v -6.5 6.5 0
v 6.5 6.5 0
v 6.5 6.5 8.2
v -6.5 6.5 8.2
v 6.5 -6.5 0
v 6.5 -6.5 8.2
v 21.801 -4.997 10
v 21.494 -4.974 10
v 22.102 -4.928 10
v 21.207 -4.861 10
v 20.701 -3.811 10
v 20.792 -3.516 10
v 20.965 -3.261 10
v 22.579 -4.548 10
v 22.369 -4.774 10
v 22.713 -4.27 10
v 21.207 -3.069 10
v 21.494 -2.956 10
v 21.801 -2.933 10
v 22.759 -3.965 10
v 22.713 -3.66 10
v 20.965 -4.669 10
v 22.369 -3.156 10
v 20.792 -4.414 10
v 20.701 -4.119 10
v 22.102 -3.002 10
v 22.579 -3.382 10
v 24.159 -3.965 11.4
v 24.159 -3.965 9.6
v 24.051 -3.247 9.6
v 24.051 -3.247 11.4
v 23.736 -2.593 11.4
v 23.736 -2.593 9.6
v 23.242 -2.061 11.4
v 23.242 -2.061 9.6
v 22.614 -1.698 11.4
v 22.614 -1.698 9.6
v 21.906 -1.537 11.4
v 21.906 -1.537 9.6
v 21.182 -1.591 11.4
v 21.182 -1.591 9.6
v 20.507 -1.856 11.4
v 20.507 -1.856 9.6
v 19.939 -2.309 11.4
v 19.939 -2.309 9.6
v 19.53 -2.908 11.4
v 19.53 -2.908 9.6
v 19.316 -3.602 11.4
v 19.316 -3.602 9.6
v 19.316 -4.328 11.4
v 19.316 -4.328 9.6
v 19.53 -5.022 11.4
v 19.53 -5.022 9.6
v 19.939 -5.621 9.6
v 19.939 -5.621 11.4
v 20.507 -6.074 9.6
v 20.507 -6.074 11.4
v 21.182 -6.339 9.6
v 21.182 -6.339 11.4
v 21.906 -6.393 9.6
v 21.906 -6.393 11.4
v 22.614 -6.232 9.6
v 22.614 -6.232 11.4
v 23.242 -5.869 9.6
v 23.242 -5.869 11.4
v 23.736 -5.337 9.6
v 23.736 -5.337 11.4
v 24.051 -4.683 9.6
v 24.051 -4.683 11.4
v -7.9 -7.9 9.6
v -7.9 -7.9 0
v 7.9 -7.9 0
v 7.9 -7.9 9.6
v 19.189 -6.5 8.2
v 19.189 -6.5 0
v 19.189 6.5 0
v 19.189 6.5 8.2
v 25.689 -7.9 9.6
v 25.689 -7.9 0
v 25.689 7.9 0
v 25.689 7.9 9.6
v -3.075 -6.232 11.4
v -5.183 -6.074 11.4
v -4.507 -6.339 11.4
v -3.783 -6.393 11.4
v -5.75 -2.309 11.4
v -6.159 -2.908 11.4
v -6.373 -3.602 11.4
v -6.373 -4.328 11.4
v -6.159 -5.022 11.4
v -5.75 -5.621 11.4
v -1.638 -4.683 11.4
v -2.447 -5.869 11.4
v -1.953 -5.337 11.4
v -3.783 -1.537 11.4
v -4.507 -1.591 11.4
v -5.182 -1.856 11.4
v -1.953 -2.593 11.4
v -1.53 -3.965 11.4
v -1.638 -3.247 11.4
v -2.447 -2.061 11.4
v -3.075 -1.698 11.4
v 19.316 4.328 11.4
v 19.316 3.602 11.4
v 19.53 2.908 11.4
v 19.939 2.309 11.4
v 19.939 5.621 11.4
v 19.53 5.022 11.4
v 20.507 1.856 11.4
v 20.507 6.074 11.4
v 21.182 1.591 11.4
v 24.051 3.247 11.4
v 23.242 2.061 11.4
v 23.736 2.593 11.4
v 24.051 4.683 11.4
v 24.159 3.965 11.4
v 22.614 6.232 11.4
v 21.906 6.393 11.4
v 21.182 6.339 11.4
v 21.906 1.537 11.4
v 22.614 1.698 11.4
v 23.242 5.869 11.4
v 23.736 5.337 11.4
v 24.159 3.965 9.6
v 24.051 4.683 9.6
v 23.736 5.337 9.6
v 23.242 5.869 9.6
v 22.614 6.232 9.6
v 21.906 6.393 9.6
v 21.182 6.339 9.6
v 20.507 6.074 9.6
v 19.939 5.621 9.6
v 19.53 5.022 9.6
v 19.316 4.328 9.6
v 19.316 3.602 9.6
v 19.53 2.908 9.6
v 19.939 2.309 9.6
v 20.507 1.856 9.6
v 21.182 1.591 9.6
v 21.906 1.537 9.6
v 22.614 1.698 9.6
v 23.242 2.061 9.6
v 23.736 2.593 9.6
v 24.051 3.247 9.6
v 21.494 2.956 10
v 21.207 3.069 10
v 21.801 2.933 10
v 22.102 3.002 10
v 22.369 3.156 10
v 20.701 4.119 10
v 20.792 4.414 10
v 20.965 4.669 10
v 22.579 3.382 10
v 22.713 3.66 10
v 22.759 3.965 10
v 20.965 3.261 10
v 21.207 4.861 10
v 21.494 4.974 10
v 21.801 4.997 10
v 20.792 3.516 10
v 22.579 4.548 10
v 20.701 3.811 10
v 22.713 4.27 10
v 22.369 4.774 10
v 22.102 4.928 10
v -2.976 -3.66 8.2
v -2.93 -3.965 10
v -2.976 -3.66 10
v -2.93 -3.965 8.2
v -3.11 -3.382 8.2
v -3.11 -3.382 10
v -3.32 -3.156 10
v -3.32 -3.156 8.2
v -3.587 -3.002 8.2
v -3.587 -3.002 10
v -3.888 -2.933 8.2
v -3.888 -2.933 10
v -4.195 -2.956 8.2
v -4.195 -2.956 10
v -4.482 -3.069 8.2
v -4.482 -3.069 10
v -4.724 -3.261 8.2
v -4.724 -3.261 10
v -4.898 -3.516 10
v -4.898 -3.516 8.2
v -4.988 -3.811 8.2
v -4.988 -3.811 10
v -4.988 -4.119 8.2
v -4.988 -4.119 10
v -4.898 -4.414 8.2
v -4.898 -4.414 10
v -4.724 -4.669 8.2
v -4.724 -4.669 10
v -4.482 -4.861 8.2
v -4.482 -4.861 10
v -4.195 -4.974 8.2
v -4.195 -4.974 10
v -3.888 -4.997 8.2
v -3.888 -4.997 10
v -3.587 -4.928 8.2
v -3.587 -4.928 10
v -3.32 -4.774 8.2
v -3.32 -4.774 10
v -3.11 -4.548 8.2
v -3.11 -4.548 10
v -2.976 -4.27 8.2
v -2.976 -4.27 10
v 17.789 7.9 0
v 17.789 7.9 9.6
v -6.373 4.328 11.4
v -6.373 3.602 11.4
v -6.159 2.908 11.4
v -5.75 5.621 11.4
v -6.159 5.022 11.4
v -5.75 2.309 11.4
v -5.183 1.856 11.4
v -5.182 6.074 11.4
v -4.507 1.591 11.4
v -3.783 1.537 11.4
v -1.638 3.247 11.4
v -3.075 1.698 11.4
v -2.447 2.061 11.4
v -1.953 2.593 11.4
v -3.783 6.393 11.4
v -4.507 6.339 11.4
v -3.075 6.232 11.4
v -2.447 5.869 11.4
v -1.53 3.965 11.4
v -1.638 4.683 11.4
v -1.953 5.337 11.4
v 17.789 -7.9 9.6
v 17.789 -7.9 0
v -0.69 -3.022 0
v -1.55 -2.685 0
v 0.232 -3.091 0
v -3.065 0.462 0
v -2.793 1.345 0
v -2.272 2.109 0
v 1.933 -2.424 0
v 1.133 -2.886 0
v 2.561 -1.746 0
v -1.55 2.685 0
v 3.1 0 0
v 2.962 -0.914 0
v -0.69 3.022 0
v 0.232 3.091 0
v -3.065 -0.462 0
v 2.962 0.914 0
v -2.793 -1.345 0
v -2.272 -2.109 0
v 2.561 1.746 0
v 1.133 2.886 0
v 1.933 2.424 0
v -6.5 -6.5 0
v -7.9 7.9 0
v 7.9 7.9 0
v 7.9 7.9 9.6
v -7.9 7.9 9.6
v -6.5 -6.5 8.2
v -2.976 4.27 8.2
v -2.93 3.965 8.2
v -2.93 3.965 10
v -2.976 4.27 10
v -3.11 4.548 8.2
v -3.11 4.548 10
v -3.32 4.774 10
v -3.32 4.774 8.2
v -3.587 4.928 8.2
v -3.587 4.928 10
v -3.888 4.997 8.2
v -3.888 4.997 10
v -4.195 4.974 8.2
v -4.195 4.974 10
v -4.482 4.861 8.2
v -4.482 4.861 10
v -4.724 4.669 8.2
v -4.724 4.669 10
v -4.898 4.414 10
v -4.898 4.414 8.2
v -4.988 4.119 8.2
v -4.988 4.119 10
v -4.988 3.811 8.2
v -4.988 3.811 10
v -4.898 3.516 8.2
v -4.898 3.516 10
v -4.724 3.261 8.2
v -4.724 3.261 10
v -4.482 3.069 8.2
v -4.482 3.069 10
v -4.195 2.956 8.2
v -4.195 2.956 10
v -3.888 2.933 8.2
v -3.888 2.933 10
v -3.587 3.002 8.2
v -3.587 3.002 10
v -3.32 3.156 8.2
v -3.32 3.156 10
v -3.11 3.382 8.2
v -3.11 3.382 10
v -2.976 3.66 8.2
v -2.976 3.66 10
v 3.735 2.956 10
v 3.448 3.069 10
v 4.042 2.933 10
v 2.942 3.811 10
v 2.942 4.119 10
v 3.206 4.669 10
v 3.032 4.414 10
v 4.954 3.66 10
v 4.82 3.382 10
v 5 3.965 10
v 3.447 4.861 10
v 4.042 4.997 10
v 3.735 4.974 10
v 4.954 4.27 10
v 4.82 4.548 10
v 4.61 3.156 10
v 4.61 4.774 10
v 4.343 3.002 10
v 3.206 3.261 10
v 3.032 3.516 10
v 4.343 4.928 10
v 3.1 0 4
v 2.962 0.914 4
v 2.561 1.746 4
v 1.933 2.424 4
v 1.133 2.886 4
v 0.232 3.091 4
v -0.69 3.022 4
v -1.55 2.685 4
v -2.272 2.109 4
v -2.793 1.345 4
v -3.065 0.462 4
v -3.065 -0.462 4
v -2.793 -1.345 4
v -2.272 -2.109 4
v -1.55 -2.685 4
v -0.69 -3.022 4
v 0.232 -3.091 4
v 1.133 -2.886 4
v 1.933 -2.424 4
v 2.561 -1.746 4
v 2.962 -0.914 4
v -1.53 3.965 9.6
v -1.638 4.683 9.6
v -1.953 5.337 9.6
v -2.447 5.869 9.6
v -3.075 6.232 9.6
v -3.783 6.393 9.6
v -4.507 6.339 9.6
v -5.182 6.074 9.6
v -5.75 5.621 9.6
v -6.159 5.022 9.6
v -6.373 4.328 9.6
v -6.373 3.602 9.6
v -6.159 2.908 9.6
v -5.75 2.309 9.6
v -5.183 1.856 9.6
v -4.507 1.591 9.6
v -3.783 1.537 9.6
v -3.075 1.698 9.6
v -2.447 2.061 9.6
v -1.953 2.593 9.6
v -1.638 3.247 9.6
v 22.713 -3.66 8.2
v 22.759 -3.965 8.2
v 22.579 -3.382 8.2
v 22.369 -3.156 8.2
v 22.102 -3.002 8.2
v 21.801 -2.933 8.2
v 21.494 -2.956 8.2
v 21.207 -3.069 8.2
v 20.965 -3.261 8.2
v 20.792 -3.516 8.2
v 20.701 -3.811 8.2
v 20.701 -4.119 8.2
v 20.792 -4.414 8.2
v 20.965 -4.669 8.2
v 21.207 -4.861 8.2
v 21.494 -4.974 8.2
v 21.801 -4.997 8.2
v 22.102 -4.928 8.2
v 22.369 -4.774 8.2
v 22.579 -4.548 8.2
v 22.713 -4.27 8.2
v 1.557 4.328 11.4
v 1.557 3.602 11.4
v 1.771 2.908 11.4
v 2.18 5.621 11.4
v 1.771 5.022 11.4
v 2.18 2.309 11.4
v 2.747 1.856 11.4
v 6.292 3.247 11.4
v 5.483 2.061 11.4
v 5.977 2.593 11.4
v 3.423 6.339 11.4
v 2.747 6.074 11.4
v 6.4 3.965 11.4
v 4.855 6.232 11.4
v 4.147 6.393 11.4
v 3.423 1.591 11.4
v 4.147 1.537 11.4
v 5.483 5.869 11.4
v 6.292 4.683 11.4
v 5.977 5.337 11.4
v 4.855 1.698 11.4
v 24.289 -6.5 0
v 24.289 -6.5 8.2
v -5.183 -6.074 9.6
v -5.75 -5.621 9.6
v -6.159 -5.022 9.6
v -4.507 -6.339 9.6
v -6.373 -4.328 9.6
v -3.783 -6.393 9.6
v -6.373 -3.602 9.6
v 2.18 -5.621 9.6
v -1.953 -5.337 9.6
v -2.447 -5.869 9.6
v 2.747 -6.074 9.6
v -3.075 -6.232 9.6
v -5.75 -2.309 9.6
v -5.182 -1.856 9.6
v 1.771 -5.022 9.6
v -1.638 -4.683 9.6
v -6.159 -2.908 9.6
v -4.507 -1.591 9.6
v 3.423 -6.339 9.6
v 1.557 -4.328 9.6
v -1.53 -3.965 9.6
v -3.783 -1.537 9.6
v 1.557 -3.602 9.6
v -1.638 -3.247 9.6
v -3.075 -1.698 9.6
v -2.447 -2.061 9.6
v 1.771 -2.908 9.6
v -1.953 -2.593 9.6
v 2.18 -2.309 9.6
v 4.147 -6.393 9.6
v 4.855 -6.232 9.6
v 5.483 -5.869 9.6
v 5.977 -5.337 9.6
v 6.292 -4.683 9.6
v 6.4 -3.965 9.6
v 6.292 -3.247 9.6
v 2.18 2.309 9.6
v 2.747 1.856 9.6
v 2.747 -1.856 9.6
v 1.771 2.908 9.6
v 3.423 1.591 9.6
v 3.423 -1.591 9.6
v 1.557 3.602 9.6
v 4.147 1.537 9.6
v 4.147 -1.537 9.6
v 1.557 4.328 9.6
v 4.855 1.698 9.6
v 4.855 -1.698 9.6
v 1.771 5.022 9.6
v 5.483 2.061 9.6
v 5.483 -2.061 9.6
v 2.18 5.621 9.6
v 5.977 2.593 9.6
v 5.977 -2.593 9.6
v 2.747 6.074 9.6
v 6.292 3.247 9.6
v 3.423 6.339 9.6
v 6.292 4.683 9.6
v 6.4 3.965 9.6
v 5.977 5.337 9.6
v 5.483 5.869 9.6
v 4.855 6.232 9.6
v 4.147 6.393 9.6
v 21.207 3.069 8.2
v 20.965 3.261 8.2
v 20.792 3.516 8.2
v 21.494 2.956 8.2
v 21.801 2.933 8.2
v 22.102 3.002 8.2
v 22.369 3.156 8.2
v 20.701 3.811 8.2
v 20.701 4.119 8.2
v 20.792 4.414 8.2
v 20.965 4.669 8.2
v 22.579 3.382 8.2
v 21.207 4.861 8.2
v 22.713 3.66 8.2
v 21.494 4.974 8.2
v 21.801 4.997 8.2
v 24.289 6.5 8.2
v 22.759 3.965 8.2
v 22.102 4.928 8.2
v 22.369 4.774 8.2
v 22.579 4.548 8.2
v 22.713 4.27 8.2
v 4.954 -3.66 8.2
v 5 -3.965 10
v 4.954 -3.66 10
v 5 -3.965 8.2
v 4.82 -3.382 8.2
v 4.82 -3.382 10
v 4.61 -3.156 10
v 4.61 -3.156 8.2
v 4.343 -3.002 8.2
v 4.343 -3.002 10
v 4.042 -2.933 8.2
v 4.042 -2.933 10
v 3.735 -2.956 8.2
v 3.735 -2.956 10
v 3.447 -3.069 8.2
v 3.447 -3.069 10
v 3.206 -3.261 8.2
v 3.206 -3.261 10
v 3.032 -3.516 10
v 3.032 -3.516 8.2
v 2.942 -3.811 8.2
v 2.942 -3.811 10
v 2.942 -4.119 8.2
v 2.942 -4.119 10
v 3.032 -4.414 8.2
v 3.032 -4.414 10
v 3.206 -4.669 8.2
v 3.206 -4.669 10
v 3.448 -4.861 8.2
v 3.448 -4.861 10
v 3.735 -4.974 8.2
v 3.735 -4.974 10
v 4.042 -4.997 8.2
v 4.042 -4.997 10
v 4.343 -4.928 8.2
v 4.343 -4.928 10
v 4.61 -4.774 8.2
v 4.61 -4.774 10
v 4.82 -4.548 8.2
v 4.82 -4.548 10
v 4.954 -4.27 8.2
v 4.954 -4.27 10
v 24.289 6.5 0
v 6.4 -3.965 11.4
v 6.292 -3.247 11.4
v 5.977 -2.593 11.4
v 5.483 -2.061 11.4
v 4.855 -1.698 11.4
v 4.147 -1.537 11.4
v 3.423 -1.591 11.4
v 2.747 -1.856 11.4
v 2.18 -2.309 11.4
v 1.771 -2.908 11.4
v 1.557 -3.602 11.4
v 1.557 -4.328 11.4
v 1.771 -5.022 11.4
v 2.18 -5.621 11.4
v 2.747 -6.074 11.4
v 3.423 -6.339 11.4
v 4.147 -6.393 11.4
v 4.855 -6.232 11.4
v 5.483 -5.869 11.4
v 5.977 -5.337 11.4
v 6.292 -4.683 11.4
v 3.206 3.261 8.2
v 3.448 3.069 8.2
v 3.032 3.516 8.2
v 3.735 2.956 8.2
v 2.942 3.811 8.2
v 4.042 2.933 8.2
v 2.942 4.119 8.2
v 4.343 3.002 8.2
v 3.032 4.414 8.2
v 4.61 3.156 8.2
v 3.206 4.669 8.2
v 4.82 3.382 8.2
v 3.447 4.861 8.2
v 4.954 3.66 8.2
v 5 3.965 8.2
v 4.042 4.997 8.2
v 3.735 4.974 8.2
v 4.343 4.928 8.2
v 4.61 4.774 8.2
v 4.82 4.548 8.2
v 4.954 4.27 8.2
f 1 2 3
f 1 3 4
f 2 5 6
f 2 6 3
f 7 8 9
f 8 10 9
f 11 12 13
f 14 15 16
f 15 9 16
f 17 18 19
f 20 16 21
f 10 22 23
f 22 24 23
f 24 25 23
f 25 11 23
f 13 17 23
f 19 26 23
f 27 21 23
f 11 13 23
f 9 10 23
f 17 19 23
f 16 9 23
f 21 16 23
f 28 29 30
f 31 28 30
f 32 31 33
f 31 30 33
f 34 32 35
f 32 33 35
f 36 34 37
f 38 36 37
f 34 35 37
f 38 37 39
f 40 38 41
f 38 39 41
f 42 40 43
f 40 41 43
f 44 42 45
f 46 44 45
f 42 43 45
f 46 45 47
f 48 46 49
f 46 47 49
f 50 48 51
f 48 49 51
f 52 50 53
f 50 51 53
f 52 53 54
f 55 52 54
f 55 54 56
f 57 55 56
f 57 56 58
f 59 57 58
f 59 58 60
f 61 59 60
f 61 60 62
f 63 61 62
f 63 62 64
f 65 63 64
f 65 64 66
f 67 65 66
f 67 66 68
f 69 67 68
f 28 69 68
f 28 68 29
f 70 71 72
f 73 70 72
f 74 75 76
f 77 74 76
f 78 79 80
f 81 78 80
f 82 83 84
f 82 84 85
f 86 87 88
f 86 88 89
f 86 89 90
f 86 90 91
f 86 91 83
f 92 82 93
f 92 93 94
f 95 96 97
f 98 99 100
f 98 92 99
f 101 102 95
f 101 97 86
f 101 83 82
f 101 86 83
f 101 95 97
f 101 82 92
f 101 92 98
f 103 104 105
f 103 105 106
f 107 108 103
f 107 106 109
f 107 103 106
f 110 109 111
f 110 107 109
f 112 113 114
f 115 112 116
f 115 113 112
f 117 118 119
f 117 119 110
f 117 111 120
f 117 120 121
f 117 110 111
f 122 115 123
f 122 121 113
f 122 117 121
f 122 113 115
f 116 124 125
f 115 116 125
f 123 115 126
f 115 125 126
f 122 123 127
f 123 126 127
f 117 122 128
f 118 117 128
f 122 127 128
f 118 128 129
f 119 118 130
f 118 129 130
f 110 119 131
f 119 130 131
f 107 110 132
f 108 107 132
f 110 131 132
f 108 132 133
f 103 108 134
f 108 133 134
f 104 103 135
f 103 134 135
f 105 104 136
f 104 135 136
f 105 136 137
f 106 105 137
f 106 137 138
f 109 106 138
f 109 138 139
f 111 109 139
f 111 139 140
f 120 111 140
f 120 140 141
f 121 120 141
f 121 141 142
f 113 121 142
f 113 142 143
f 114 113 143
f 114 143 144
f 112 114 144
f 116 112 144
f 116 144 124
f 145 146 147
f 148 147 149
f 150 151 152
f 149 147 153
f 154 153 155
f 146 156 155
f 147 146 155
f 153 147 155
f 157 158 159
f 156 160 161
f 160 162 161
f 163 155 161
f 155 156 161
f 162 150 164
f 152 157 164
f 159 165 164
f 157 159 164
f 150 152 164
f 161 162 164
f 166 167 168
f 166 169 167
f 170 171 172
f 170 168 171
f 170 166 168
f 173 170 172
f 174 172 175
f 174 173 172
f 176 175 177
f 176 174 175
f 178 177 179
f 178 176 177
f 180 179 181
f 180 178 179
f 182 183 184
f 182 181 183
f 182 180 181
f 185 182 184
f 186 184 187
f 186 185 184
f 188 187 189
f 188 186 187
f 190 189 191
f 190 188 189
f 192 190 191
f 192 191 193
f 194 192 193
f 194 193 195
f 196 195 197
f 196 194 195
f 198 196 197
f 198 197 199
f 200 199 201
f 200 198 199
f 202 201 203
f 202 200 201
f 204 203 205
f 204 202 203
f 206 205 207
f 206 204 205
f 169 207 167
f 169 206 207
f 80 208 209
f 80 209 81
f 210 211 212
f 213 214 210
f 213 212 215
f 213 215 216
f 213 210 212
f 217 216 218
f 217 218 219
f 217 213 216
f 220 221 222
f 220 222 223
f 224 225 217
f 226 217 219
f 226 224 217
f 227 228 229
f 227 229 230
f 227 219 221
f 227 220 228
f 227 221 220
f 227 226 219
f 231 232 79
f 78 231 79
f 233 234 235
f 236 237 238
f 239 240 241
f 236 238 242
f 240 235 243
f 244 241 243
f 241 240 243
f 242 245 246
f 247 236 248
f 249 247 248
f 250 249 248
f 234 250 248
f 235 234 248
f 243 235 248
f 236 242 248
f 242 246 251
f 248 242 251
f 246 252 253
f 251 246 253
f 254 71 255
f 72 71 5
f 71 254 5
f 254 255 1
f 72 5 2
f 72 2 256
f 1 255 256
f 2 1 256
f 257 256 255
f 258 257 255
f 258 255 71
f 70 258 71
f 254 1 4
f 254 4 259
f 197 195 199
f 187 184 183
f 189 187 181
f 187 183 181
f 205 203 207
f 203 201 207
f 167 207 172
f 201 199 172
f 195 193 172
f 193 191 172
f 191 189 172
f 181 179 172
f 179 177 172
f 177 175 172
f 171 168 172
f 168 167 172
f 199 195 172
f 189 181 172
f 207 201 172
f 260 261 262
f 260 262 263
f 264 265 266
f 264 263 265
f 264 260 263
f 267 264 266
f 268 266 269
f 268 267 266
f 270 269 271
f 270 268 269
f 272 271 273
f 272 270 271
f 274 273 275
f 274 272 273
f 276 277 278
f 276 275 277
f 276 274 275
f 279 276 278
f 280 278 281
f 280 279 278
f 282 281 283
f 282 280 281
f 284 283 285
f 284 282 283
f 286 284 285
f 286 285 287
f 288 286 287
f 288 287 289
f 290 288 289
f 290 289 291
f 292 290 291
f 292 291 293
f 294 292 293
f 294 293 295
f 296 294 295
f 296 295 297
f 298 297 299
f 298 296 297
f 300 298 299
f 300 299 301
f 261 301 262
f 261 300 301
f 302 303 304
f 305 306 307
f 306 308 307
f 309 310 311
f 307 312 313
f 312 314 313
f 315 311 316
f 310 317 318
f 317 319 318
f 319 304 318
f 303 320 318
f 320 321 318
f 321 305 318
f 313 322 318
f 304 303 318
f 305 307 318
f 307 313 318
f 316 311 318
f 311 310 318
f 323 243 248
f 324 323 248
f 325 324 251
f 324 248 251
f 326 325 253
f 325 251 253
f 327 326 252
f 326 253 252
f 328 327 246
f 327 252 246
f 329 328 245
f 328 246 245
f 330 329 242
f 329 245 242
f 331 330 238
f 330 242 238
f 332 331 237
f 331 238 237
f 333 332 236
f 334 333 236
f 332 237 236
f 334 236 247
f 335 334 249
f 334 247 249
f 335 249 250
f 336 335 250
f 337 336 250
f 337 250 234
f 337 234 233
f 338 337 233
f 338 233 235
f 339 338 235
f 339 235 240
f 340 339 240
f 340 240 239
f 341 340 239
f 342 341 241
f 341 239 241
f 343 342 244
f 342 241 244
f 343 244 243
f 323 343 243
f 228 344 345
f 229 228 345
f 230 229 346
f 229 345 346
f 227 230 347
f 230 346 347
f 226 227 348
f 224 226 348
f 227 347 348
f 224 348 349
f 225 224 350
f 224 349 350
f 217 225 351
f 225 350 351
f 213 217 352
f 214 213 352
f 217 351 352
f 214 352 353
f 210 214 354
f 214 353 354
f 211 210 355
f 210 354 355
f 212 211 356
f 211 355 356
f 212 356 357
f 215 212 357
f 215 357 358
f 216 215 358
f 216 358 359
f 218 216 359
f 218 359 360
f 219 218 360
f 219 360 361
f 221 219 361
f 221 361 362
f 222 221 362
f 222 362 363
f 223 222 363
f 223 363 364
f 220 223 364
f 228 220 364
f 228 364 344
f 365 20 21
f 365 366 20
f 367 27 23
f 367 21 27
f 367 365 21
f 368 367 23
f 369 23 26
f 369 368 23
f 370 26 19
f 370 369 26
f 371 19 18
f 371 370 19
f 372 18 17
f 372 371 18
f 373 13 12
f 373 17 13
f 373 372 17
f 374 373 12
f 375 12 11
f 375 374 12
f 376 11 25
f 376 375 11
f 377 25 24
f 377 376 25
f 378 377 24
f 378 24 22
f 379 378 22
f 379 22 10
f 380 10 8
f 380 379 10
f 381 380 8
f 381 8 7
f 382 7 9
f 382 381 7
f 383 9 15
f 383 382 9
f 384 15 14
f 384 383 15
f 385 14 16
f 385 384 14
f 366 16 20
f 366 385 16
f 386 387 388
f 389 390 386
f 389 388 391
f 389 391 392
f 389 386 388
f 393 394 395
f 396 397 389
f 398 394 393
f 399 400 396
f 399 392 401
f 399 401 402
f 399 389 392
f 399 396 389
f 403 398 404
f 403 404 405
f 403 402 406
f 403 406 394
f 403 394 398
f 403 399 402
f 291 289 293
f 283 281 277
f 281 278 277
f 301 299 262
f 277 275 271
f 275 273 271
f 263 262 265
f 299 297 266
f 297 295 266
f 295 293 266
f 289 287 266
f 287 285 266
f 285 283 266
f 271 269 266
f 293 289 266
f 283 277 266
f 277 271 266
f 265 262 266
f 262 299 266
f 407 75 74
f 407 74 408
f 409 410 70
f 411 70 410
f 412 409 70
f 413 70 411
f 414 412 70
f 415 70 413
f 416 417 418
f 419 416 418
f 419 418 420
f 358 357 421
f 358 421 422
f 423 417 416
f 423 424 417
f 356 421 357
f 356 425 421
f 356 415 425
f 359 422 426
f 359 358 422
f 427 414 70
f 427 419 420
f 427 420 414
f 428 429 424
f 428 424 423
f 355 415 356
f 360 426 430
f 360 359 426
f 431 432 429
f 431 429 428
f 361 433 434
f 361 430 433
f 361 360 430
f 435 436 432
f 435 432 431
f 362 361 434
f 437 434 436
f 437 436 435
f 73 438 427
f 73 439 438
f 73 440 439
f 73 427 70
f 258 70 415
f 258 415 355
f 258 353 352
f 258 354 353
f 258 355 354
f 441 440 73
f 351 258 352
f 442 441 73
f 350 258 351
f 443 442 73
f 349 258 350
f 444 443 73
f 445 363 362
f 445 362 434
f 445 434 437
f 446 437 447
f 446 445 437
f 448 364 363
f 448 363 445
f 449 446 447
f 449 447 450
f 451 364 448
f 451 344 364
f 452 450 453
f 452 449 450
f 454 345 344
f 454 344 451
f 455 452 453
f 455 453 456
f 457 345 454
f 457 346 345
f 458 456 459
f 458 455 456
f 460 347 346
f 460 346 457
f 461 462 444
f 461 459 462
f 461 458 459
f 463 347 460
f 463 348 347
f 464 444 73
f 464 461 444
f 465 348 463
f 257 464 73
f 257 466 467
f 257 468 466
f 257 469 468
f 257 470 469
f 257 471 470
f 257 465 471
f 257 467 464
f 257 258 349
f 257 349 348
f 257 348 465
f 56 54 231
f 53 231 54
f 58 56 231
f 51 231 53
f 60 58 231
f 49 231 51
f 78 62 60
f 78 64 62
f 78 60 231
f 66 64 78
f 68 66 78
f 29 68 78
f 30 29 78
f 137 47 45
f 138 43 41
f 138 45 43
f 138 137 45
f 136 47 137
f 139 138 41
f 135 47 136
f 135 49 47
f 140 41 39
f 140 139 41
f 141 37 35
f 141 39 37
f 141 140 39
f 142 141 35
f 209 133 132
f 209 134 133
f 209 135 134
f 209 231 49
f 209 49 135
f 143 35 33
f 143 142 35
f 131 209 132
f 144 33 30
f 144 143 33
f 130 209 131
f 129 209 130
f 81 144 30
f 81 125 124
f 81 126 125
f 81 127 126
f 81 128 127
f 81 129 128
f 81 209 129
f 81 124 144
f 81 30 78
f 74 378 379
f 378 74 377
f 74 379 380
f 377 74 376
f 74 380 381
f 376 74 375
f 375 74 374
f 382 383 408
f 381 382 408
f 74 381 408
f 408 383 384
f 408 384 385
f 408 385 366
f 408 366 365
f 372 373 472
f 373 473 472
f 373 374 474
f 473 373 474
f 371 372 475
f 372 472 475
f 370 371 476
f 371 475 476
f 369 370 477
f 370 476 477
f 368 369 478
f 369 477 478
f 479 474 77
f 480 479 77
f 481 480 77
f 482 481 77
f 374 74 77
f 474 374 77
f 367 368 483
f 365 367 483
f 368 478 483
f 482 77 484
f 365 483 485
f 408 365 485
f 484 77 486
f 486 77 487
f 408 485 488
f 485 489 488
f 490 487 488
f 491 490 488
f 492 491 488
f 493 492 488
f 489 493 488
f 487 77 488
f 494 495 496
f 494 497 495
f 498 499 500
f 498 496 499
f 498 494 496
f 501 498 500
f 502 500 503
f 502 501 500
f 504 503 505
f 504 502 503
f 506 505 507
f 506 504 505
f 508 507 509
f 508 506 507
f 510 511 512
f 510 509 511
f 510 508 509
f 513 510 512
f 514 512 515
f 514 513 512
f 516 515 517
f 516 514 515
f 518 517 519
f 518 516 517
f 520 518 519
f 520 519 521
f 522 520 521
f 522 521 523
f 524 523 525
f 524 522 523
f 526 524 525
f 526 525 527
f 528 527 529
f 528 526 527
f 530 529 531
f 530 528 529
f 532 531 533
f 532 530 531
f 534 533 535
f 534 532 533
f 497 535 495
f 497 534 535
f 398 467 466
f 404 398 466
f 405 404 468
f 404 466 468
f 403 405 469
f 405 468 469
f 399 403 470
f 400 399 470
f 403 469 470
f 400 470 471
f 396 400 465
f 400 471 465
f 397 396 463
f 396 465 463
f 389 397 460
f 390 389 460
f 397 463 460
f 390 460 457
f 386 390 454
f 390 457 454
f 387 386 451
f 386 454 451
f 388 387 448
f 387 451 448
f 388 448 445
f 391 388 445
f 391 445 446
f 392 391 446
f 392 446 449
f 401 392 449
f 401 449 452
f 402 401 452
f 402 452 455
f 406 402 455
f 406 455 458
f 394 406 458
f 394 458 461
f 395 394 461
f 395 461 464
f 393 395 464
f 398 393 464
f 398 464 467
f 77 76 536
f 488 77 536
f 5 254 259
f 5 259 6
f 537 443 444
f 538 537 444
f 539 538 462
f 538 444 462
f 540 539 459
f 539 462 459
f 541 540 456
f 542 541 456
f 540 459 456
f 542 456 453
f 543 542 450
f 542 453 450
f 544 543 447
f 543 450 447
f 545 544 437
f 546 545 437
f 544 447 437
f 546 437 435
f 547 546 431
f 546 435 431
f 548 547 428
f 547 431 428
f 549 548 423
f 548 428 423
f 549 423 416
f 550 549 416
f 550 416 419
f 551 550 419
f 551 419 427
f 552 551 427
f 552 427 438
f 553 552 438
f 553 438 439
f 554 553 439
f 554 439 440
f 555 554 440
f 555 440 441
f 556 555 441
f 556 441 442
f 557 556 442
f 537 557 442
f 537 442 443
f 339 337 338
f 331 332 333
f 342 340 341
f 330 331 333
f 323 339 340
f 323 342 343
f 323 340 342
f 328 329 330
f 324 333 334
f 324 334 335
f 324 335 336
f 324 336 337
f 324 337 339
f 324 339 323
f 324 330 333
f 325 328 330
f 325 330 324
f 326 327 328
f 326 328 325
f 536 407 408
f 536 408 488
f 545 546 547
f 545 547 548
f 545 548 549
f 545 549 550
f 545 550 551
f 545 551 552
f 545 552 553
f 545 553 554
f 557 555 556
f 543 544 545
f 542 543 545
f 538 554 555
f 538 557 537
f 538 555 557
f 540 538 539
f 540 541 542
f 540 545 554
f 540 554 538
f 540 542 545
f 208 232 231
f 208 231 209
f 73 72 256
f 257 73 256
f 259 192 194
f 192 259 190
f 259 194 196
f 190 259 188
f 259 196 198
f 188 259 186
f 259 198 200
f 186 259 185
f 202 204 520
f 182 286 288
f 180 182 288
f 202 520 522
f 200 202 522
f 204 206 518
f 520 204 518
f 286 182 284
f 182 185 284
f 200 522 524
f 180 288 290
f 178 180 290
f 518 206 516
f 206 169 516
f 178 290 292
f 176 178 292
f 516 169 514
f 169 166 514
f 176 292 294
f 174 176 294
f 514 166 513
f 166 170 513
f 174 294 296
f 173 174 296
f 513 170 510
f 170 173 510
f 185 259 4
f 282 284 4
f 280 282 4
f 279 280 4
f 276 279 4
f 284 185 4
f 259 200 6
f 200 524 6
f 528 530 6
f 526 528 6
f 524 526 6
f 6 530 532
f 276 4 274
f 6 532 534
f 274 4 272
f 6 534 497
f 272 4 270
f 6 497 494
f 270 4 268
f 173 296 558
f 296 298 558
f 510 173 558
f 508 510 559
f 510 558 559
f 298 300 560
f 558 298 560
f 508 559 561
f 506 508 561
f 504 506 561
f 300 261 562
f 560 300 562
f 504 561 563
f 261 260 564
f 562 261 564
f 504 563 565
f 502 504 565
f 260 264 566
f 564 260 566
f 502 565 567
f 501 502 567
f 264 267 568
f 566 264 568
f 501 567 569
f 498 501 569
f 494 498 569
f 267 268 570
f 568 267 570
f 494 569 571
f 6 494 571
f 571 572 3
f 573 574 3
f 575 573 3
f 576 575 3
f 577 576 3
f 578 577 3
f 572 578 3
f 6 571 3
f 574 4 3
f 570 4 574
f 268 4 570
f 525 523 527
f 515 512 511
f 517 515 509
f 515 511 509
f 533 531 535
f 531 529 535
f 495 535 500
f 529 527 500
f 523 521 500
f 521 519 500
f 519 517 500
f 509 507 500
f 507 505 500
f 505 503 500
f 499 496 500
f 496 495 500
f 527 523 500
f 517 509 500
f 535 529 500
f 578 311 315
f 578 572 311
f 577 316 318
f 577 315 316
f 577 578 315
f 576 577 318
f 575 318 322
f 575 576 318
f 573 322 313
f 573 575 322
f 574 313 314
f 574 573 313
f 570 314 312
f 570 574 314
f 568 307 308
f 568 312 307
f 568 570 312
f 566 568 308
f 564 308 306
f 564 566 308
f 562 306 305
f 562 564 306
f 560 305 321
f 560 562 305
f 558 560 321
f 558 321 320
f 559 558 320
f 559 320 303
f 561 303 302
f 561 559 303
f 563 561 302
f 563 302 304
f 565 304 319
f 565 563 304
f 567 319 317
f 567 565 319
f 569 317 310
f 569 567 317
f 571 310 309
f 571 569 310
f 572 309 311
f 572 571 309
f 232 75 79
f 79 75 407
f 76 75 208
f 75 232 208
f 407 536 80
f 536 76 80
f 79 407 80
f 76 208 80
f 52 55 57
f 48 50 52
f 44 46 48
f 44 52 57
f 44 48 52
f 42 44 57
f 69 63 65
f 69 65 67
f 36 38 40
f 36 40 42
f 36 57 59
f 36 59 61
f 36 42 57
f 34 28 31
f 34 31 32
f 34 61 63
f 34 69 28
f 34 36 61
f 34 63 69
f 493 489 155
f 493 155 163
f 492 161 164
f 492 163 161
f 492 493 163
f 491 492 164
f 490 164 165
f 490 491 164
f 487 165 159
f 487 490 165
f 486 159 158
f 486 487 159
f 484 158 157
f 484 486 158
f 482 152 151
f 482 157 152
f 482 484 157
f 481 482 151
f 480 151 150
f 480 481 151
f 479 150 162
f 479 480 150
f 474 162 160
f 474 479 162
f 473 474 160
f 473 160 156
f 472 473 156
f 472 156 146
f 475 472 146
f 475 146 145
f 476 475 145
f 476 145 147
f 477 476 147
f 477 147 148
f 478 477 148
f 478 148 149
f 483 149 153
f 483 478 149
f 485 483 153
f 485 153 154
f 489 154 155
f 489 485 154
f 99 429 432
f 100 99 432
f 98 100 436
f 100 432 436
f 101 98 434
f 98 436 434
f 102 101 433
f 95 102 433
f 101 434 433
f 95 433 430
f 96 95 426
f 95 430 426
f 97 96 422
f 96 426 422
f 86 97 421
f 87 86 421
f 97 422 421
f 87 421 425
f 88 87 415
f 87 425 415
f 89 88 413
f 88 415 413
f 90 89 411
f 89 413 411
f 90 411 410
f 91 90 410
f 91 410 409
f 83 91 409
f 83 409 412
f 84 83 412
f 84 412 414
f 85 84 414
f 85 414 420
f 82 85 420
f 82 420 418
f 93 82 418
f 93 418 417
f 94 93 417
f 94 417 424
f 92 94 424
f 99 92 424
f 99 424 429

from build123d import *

# Parameters (mm, degrees)
F0_R     = 2.435
F1_DEPTH = 9.6
F2_DEPTH = 11.4
F3_W     = 7.9
F3_H     = 15.8
F3_R     = 2.435
F4_DEPTH = 9.6
F5_DEPTH = 11.4
F6_T     = -1.4
F7_T     = -1.4
F8_R     = 3.1
F9_DEPTH = 4


with BuildPart() as f1:
    # F0 (on Top) → F1 (new body)
    with BuildSketch(Plane.XY):
        Polygon((-7.9, -7.9), (7.9, -7.9), (7.9, 7.9), (-7.9, 7.9), (-7.9, 0), align=None)
        with Locations((-3.965, -3.965)):
            Circle(F0_R, mode=Mode.SUBTRACT)
        with Locations((3.965, -3.965)):
            Circle(F0_R, mode=Mode.SUBTRACT)
        with Locations((-3.965, 3.965)):
            Circle(F0_R, mode=Mode.SUBTRACT)
        with Locations((3.965, 3.965)):
            Circle(F0_R, mode=Mode.SUBTRACT)
    extrude(amount=F1_DEPTH)

    # F0 (on Top) → F2 (join)
    with BuildSketch(Plane.XY):
        with Locations((-3.965, 3.965)):
            Circle(F0_R)
        with Locations((3.965, 3.965)):
            Circle(F0_R)
        with Locations((3.965, -3.965)):
            Circle(F0_R)
        with Locations((-3.965, -3.965)):
            Circle(F0_R)
    extrude(amount=F2_DEPTH)

    # F6
    f6_openings = [f1.faces().sort_by_distance(p)[0] for p in [
        (0, 0, 0),
    ]]
    offset(amount=F6_T, openings=f6_openings, kind=Kind.INTERSECTION)


with BuildPart() as f4:
    # F3 (on Top) → F4 (new body)
    with BuildSketch(Plane.XY):
        with Locations((21.7390172184, 0)):
            Rectangle(F3_W, F3_H)
        with Locations((21.7240172184, -3.965)):
            Circle(F3_R, mode=Mode.SUBTRACT)
        with Locations((21.7240172184, 3.965)):
            Circle(F3_R, mode=Mode.SUBTRACT)
    extrude(amount=F4_DEPTH)

    # F3 (on Top) → F5 (join)
    with BuildSketch(Plane.XY):
        with Locations((21.7240172184, 3.965)):
            Circle(F3_R)
        with Locations((21.7240172184, -3.965)):
            Circle(F3_R)
    extrude(amount=F5_DEPTH)

    # F7
    f7_openings = [f4.faces().sort_by_distance(p)[0] for p in [
        (21.739017, 0, 0),
    ]]
    offset(amount=F7_T, openings=f7_openings, kind=Kind.INTERSECTION)


with BuildPart() as f9:
    # F8 (on Top) → F9 (new body)
    with BuildSketch(Plane.XY):
        Circle(F8_R)
    extrude(amount=F9_DEPTH)


solid = Compound([f1.part, f4.part, f9.part])
